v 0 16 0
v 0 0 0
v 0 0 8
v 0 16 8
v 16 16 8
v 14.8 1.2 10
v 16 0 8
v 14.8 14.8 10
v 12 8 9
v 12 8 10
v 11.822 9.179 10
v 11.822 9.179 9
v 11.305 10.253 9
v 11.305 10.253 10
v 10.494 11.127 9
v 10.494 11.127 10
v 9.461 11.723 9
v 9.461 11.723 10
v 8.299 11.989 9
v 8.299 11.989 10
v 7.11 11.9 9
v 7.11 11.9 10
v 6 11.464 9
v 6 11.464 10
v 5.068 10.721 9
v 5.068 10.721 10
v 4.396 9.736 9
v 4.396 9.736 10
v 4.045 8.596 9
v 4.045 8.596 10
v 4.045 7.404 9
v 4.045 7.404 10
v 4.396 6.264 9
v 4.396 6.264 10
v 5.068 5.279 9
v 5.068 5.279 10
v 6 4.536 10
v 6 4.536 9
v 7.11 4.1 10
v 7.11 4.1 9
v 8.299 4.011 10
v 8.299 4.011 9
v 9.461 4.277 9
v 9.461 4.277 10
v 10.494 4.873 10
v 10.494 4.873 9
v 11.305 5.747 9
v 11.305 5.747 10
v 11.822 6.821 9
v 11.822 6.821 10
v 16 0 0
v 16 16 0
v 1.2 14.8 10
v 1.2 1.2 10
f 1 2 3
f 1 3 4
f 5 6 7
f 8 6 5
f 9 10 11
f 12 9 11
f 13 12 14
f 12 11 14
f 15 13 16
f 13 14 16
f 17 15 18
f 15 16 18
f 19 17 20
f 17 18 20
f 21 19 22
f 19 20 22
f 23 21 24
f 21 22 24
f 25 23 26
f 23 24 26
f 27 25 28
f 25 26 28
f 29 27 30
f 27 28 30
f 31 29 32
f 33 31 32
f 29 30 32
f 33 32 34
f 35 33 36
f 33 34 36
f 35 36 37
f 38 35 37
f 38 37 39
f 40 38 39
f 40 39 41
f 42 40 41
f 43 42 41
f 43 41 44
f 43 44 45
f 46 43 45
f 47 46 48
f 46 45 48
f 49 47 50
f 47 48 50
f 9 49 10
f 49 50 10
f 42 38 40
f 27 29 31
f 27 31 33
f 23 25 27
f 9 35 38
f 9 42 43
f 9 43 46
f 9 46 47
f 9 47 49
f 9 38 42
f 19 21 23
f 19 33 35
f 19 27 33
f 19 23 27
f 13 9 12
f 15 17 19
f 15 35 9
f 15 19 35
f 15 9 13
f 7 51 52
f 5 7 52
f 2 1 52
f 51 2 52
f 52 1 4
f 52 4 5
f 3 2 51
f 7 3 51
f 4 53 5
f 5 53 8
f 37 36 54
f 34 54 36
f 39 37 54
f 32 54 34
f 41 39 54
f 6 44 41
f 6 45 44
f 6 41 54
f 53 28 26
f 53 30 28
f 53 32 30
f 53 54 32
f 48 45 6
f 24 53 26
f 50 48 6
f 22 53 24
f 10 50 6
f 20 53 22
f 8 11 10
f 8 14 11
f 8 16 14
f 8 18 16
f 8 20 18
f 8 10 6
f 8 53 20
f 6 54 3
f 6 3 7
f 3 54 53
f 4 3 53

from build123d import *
from OCP.BRepFilletAPI import BRepFilletAPI_MakeChamfer

# Parameters (mm, degrees)
SKETCH1_W           = 16
SKETCH1_H           = 16
BOSS_EXTRUDE1_DEPTH = 10
SKETCH2_R           = 4
CUT_EXTRUDE1_DEPTH  = 1
FILLET4_SIZE        = 2
FILLET4_SIZE2       = 1.2


with BuildPart() as part:
    # Sketch1 → Boss-Extrude1 (new body)
    with BuildSketch(Plane.XY):
        with Locations((8, 8)):
            Rectangle(SKETCH1_W, SKETCH1_H)
    extrude(amount=BOSS_EXTRUDE1_DEPTH)

    # Sketch2 → Cut-Extrude1 (cut)
    with BuildSketch(Plane.XY.offset(10)):
        with Locations((8, 8)):
            Circle(SKETCH2_R)
    extrude(amount=-CUT_EXTRUDE1_DEPTH, mode=Mode.SUBTRACT)

    # Fillet4: one chamfer whose edges measure the first distance from different faces: ONE call of the kernel's chamfer builder (chamfer() names one face for all edges)
    fillet4_edges_1 = [part.edges().sort_by_distance(p)[0] for p in [
        (16, 8, 10),
    ]]
    fillet4_side_1 = [part.faces().sort_by_distance(p)[0] for p in [
        (16, 8, 5),
    ]]
    fillet4_edges_2 = [part.edges().sort_by_distance(p)[0] for p in [
        (8, 16, 10),
    ]]
    fillet4_side_2 = [part.faces().sort_by_distance(p)[0] for p in [
        (8, 16, 5),
    ]]
    fillet4_edges_3 = [part.edges().sort_by_distance(p)[0] for p in [
        (0, 8, 10),
    ]]
    fillet4_side_3 = [part.faces().sort_by_distance(p)[0] for p in [
        (0, 8, 5),
    ]]
    fillet4_edges_4 = [part.edges().sort_by_distance(p)[0] for p in [
        (8, 0, 10),
    ]]
    fillet4_side_4 = [part.faces().sort_by_distance(p)[0] for p in [
        (8, 0, 5),
    ]]
    fillet4 = BRepFilletAPI_MakeChamfer(part.part.solid().wrapped)
    for e in fillet4_edges_1:
        fillet4.Add(FILLET4_SIZE, FILLET4_SIZE2, e.wrapped, fillet4_side_1[0].wrapped)  # the first distance lies on this face
    for e in fillet4_edges_2:
        fillet4.Add(FILLET4_SIZE, FILLET4_SIZE2, e.wrapped, fillet4_side_2[0].wrapped)  # the first distance lies on this face
    for e in fillet4_edges_3:
        fillet4.Add(FILLET4_SIZE, FILLET4_SIZE2, e.wrapped, fillet4_side_3[0].wrapped)  # the first distance lies on this face
    for e in fillet4_edges_4:
        fillet4.Add(FILLET4_SIZE, FILLET4_SIZE2, e.wrapped, fillet4_side_4[0].wrapped)  # the first distance lies on this face
    add(Compound.cast(fillet4.Shape()), mode=Mode.REPLACE)


solid = part.part
